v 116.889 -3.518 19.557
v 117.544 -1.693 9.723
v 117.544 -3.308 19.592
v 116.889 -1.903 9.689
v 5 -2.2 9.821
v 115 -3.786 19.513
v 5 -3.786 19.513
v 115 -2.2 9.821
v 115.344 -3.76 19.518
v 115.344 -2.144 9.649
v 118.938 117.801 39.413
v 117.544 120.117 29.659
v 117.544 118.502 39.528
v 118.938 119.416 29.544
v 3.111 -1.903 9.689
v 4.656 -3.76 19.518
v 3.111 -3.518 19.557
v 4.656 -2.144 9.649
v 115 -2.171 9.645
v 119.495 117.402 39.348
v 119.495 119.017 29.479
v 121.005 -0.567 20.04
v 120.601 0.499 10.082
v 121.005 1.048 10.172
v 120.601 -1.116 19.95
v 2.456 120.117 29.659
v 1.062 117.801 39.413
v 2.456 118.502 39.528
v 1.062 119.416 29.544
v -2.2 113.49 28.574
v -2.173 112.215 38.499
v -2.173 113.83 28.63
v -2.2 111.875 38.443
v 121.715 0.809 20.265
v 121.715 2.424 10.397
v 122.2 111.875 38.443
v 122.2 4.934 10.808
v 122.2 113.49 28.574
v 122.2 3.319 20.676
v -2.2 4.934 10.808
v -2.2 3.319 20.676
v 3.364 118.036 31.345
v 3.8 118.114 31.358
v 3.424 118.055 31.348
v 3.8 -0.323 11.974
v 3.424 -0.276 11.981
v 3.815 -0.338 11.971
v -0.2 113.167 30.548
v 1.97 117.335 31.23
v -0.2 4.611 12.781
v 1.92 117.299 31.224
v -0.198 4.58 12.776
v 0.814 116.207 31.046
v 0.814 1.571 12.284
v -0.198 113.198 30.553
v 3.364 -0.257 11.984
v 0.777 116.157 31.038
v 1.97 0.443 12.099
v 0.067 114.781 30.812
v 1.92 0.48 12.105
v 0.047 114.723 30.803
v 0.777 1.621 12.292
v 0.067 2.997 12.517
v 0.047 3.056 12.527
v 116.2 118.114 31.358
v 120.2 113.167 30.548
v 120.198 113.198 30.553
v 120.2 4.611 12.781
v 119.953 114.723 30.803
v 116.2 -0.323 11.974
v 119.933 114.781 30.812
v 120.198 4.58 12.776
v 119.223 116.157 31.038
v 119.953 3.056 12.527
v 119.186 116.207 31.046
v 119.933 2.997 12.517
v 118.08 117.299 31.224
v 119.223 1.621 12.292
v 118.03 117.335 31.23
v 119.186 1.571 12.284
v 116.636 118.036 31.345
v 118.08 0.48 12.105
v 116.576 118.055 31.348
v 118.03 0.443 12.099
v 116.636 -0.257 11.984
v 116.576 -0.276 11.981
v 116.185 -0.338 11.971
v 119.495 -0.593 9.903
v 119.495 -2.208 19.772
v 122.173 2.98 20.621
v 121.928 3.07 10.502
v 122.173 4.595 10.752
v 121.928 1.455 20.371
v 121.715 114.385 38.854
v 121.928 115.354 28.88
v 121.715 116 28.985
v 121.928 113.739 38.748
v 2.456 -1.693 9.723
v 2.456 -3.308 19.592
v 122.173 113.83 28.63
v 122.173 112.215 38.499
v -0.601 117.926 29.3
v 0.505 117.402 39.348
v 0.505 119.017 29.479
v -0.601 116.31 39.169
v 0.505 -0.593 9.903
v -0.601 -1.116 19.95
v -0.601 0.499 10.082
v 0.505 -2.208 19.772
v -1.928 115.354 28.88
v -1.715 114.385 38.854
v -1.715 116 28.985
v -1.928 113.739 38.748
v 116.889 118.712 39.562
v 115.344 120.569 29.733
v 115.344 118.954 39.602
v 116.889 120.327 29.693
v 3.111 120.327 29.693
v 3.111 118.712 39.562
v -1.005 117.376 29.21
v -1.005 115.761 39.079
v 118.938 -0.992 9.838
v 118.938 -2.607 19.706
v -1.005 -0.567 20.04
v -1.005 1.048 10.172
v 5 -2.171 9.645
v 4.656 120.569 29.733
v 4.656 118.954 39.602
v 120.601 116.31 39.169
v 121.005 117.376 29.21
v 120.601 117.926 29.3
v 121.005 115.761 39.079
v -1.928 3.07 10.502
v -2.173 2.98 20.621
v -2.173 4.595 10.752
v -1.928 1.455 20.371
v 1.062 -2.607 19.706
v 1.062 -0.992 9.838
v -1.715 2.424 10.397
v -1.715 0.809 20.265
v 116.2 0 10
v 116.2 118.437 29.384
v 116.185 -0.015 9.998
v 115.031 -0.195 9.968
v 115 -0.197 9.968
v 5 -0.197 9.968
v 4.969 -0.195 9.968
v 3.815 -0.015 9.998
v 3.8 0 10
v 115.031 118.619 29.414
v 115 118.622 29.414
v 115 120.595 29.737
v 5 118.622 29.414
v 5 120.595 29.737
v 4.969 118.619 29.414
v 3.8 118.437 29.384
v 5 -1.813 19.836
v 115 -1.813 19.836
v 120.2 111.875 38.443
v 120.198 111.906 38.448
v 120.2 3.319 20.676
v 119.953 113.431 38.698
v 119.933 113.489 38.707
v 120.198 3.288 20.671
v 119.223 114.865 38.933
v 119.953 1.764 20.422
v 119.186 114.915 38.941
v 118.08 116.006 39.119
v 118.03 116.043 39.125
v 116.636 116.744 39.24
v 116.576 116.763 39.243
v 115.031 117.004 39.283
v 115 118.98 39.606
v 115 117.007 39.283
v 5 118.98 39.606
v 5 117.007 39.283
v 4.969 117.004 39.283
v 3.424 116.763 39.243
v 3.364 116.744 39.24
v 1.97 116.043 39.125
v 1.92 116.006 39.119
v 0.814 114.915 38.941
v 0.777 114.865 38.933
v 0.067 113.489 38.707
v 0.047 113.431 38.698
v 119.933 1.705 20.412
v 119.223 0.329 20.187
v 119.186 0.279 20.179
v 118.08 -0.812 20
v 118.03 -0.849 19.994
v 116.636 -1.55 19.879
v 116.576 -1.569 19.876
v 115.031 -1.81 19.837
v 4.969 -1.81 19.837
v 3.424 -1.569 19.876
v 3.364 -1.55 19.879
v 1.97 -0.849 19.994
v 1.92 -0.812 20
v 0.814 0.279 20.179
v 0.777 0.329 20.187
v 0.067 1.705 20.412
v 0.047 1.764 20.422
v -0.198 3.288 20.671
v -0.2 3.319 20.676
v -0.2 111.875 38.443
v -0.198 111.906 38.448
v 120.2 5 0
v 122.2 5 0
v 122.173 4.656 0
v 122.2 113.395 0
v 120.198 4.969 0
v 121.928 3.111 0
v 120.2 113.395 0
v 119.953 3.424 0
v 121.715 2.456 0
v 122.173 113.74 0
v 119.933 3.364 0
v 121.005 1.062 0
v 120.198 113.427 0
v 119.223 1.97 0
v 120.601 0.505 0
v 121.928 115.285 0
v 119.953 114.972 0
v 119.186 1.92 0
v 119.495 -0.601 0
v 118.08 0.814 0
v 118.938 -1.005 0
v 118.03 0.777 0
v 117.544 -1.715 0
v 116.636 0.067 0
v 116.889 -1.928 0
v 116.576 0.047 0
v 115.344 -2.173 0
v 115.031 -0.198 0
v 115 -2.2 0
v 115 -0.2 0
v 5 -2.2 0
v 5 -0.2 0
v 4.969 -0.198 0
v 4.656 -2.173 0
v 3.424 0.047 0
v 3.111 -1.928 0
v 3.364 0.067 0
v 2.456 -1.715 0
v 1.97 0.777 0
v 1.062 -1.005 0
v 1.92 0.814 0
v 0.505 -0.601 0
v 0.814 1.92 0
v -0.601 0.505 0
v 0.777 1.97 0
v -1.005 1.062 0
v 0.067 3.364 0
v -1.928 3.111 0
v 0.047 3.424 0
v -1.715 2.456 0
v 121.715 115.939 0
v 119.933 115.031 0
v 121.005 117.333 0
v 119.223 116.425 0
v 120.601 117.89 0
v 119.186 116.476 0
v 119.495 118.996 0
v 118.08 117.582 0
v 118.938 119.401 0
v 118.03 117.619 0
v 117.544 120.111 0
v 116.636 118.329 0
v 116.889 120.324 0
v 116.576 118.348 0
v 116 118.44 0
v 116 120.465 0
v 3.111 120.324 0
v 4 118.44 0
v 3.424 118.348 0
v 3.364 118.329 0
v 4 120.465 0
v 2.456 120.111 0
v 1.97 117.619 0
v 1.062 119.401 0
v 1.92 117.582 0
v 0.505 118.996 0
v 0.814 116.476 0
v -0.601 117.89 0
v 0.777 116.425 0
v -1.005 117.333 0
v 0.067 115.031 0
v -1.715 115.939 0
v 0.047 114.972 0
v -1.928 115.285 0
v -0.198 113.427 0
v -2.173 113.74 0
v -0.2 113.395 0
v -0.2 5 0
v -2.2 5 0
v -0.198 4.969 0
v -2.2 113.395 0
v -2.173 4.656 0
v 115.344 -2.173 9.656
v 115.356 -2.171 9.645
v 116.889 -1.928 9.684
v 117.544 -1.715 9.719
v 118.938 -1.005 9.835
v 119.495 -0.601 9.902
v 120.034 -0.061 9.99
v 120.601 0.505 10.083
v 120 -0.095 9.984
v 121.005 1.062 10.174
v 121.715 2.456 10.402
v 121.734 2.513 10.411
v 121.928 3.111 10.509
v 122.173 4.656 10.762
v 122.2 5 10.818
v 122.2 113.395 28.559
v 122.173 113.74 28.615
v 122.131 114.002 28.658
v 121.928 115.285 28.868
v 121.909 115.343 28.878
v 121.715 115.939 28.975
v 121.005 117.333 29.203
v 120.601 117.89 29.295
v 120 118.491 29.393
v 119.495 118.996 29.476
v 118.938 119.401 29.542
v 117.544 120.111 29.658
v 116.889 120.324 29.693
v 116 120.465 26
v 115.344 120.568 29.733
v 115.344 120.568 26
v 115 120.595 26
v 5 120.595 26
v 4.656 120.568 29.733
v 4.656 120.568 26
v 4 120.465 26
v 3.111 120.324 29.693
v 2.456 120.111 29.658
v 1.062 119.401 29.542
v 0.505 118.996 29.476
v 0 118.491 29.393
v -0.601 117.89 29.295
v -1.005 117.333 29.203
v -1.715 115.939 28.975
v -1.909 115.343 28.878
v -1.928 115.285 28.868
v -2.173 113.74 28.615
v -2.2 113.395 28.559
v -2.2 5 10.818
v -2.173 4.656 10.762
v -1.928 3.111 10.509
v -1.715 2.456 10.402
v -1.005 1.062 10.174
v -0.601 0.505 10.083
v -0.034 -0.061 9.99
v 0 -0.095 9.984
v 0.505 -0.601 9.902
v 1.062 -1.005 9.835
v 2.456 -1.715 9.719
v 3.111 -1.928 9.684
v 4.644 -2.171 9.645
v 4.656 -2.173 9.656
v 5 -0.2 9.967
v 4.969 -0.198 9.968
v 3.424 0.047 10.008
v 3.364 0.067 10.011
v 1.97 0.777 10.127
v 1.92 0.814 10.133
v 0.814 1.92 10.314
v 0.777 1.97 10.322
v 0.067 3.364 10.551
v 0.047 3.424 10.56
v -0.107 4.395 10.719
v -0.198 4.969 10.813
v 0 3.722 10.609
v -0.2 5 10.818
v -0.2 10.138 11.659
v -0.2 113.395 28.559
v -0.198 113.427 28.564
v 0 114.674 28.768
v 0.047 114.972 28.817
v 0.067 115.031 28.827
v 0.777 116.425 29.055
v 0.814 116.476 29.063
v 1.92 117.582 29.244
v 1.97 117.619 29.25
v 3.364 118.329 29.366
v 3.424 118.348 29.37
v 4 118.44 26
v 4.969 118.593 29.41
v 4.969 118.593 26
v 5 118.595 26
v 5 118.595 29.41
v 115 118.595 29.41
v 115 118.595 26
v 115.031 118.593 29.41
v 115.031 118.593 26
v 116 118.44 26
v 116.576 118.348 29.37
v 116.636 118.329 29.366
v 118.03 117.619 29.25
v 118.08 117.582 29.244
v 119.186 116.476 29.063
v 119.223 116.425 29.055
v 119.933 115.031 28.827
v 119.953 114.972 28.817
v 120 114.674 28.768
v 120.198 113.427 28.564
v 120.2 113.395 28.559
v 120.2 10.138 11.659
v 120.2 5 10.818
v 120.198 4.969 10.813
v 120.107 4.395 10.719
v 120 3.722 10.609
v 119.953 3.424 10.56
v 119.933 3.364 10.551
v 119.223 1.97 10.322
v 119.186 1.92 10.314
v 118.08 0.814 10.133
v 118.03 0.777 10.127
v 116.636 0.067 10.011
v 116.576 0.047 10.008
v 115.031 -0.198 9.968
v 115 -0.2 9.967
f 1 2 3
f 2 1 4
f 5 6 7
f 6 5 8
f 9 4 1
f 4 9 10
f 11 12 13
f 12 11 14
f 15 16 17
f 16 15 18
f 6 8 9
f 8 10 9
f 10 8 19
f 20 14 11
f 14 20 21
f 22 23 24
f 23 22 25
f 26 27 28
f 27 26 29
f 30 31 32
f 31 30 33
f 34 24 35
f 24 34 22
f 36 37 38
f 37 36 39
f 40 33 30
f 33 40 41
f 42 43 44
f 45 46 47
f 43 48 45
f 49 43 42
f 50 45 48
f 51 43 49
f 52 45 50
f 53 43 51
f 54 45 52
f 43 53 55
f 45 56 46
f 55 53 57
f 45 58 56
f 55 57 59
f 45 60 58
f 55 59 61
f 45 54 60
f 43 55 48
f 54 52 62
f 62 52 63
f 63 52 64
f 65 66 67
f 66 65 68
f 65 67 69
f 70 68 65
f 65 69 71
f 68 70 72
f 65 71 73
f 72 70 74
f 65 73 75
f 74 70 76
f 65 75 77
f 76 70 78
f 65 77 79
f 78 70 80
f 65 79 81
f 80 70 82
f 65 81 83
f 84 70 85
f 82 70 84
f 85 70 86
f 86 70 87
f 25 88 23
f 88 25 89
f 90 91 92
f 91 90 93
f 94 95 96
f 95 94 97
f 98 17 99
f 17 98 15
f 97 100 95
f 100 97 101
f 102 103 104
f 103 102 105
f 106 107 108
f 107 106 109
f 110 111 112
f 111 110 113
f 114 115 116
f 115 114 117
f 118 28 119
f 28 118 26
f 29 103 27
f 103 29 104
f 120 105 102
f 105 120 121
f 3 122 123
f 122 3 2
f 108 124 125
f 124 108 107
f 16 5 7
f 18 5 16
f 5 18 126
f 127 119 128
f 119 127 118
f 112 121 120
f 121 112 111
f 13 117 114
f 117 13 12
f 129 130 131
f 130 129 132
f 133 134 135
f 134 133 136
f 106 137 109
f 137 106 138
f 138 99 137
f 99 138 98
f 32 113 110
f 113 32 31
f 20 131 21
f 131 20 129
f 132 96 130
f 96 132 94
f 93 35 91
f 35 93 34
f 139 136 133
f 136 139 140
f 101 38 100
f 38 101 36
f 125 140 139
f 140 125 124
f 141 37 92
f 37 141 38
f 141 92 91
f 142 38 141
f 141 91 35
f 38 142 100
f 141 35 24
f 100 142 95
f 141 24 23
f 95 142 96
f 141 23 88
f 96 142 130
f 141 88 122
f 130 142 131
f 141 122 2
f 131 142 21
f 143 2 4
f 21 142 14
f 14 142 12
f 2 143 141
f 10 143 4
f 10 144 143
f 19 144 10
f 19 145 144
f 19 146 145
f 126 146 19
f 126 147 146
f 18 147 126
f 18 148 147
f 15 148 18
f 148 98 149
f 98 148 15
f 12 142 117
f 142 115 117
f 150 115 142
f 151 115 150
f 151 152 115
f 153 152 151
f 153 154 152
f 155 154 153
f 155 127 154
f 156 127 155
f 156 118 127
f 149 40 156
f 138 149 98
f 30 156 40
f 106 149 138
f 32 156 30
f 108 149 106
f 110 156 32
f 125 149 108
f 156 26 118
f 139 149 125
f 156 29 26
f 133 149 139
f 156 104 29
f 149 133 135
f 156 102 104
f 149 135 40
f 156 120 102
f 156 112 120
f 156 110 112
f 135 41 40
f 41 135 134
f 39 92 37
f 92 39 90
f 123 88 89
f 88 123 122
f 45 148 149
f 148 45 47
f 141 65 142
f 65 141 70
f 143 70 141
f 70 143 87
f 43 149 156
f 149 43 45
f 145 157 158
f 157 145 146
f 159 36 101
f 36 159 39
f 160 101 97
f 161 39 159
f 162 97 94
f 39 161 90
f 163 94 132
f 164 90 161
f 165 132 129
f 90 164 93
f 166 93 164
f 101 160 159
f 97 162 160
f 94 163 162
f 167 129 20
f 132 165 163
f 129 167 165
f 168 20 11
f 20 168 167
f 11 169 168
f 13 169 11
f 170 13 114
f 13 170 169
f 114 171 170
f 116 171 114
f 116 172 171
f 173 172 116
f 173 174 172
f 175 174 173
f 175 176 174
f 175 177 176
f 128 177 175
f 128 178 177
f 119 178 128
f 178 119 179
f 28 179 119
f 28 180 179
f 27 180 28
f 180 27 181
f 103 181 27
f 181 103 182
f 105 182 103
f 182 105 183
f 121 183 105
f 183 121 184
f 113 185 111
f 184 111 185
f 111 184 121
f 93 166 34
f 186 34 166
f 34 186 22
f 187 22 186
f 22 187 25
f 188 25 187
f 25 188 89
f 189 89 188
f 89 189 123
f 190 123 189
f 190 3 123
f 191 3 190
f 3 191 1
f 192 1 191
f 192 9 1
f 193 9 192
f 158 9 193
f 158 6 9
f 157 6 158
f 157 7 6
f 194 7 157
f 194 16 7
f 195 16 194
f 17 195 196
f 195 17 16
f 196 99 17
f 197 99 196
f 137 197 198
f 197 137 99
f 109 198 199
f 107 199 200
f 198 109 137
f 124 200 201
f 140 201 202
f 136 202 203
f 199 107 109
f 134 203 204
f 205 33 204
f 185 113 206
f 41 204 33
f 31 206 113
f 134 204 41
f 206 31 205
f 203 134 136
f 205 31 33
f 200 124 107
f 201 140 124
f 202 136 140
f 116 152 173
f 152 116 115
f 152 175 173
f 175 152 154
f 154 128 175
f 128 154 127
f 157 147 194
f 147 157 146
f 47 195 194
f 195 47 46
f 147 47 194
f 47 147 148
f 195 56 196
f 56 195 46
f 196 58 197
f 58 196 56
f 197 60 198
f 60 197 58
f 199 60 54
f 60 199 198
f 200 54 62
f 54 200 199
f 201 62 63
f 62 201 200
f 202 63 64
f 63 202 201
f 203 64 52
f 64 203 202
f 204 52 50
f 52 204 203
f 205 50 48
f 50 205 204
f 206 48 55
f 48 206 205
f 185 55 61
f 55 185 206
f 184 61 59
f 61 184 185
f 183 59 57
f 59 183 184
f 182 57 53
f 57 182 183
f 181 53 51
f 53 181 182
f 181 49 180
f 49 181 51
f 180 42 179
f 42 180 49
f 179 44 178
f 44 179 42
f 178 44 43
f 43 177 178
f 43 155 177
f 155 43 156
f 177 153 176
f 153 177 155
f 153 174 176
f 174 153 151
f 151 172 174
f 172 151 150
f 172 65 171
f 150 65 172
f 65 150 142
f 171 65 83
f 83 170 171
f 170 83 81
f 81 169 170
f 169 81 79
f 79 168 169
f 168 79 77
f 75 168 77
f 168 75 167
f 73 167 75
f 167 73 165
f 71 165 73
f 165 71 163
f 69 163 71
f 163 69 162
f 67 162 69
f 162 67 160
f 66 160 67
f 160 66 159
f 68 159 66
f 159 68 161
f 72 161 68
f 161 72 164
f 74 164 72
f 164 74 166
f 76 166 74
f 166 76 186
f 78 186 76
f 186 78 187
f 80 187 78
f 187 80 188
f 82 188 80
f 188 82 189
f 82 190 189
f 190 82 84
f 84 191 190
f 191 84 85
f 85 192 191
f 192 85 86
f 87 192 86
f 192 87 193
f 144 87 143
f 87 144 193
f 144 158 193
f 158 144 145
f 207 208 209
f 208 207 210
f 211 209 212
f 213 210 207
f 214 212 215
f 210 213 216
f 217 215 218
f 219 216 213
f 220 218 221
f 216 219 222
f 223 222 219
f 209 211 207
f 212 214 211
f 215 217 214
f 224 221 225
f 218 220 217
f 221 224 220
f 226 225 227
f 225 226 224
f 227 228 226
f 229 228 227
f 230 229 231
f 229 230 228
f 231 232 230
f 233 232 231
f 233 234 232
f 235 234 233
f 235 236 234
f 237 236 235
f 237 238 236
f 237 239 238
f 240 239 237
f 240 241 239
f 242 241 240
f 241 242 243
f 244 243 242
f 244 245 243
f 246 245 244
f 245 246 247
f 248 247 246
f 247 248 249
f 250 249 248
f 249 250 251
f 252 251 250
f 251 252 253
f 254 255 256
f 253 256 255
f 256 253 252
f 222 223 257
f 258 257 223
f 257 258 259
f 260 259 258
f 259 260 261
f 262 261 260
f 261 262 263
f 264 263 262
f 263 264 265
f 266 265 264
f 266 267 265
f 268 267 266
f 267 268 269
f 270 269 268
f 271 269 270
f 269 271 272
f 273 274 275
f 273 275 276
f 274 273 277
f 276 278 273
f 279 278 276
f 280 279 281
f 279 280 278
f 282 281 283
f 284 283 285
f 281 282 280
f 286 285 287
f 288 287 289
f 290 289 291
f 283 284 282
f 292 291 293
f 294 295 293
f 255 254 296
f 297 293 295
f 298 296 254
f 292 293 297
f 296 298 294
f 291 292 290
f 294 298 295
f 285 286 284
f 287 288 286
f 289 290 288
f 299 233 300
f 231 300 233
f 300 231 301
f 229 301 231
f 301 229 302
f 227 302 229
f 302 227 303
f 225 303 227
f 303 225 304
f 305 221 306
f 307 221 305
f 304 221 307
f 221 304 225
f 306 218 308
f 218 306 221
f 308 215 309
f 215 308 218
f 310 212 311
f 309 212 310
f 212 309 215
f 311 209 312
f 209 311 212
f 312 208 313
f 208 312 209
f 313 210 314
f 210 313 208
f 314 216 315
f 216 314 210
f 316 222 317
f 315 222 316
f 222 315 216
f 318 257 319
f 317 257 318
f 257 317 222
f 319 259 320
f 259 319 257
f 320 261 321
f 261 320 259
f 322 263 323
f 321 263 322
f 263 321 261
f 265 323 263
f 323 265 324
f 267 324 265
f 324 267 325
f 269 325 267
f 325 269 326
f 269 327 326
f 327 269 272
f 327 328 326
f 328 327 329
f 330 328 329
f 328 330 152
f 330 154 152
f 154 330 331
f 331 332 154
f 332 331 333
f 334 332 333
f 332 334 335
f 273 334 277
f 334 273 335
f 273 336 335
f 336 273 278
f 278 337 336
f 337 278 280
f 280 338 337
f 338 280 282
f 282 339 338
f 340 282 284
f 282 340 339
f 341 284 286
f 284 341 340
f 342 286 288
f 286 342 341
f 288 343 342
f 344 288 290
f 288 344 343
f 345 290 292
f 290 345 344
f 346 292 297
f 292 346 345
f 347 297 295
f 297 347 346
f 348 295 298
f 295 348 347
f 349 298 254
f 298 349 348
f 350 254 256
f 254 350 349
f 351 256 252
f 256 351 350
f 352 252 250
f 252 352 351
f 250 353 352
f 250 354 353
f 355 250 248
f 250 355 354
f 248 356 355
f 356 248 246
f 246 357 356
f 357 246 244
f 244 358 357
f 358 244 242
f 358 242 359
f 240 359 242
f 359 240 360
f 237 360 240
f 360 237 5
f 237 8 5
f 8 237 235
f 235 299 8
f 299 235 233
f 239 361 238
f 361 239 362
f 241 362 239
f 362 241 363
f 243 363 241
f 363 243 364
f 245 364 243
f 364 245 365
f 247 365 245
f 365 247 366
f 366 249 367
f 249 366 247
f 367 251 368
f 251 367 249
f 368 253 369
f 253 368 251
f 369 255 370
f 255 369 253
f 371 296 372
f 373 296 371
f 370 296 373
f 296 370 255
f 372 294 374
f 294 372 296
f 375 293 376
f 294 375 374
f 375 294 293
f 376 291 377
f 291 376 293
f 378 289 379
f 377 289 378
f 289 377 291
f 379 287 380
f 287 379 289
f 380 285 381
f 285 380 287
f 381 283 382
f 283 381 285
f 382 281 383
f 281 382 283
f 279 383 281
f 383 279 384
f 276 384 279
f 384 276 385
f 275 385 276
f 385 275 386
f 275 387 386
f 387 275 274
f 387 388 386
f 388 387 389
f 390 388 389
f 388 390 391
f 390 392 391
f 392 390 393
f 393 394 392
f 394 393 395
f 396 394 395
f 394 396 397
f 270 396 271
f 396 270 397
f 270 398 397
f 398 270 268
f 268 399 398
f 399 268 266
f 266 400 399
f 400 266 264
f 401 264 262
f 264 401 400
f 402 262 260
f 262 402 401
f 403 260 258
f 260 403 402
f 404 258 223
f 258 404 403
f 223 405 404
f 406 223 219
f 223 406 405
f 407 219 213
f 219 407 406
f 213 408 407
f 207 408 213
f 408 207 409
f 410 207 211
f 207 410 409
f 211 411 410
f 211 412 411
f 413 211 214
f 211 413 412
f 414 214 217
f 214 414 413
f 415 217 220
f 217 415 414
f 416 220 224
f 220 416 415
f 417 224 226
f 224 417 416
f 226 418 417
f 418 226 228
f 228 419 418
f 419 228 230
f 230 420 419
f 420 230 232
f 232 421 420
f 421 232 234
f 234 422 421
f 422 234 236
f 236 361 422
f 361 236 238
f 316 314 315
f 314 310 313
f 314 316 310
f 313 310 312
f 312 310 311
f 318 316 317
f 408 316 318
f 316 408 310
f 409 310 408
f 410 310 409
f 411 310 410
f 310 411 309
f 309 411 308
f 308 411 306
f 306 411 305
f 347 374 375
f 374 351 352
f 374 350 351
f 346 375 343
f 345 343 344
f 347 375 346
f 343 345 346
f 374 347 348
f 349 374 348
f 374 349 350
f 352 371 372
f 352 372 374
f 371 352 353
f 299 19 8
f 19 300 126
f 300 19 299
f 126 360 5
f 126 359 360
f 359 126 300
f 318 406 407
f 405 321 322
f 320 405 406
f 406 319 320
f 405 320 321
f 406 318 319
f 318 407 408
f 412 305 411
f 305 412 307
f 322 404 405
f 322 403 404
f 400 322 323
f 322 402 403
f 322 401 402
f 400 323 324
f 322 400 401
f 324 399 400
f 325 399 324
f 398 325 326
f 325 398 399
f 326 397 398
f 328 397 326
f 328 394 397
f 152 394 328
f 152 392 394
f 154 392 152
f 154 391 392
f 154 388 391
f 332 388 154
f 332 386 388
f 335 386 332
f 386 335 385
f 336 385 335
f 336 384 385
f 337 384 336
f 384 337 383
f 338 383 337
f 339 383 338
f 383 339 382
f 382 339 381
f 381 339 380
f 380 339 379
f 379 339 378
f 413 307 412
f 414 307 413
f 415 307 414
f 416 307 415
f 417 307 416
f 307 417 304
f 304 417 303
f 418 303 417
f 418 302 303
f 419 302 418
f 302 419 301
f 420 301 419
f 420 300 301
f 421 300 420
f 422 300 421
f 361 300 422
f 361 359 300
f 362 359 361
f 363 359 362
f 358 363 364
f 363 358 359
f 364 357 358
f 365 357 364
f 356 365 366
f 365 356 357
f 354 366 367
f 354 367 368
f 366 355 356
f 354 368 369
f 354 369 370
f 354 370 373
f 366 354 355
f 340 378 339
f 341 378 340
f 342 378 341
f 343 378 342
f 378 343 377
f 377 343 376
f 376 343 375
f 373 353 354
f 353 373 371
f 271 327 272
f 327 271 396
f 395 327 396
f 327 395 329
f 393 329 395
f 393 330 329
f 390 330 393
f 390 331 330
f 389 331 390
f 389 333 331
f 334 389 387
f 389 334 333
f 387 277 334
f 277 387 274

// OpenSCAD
// file: ../lib/utils.scad
include <params.scad>;

function tol(val) = val - tolerance;

module cone(r, angle, invert=false) {
    h = tan((180 - angle) / 2) * r;
    translate([0, 0, -h]) {
        if (invert) {
                cylinder(r1=r,r2=0,h=h, $fn=20); 
        } else {
            cylinder(r1=0,r2=r,h=h, $fn=20); 
        }
    }
}

module roundrect(vect, r, $fn=20) {
    sq = len(vect) > 1
        ? [for (i = [0:1:len(vect)-1]) vect[i] - r * 2]
        : vect - r * 2;
    minkowski() {
        square(sq);
        translate([r, r])
            circle(r=r);
    }
}

module profile($fn=20) {
    minkowski() {
        translate([fan_case_radius, fan_case_radius, 0])
            square(fan_case - fan_case_radius * 2);
        circle(fan_case_radius, $fn);
    }
}

module fan_mount_points(radius, $fn=20) {
    offset = (fan_case - fan_screw_distance) / 2;
    translate([offset, offset, 0]) {
        circle(radius, $fn);
        translate([fan_screw_distance, 0, 0])
            circle(radius, $fn);
        translate([fan_screw_distance, fan_screw_distance, 0])
            circle(radius, $fn);
        translate([0, fan_screw_distance, 0])
            circle(radius, $fn);
    }
}

module square_grill(width, height, fin_width, fin_count) {
    fin_spacing = width / fin_count;
    difference() {
        square(width);
        union() {
            for (i = [0:1:fin_count]) {
                translate([(i + 1) * fin_spacing - (fin_spacing / 2) - (fin_width / 2), 0, 0])
                    square([fin_width, height]);
            }
        }
    }
}

module bushing(outer_r, inner_r, h) {
    linear_extrude(h)
        difference() {
            circle(r=outer_r);
            circle(r=inner_r);
        }
}

module screw_at_origin(r, d, l, head, head_d, cap, angle) {
    translate([0, 0, -l])
        screw(r, d, l, head, head_d, cap, angle);
}

module screw(r, d, l, head, head_d, cap, angle, fn=20, head_fn) {
    radius = r > 0 ? r : d / 2;
    head_r = head > 0 ? head : head_d / 2;
    hfn = head_fn ? head_fn : fn;

    union() {
        if (angle) {
            translate([0, 0, l])
                cone(head_r, angle, false);
        }
        linear_extrude(l)
            circle(r=radius, $fn=fn);
        if (cap > 0) {
            translate([0, 0, l - cap])
                linear_extrude(cap)
                    circle(r=head_r, $fn=hfn);
        }
    }
}

module inset_screw(r, d, l, head, head_d, cap, angle, inset, fn=20, head_fn) {
    screw_height = l - inset;
    head_r = head > 0 ? head : head_d / 2;

    union() {
        screw(
            r=r,
            d=d,
            l=screw_height,
            head=head_r,
            cap=cap,
            angle=angle,
            fn=fn,
            head_fn=head_fn
        );
        translate([0, 0, screw_height])
            linear_extrude(inset)
                circle(r=head_r, $fn=fn);
    }
}

function inch_to_mm(inches) = inches * 25.4;
// file: ../lib/params.scad
/*************/
/** Exhaust **/
/*************/

/**
 * Fan case sizes: used for all fan parts, including adapters, inlets
 * grills.
 */
fan_case = 120;
fan_screw_distance = 105;
fan_case_depth = 25;
fan_case_radius = 5;
fan_case_screw_radius = 2.5;
fan_case_socket_cap_radius = 5.6 / 2;
fan_case_screw_head_radius = 3;
fan_case_screw_head_angle = 90;

/**
 * Fan grill
 */
grill_screw_size = 3;
grill_screw_radius = grill_screw_size / 2;
grill_screw_inset = 2;
grill_radius = 114 / 2;
grill_fin_offset = 10;
grill_fin_thickness = 2;
grill_fin_degrees = 30;

rear_grill_thickness = 2;

front_grill_thickness = 2;
front_grill_fin_count = 6;
front_grill_fin_thickness = 2;

/**
 * Fan duct filter
 */
filter_thickness = 5;
filter_width = fan_screw_distance - fan_case_screw_radius * 3;
filter_offset = (fan_case - filter_width) / 2;

base_retainer_thickness = 2;
base_height = 30;
base_cut_offset = 10;
base_retainer_inset = 4;

/**
 * Fan to duct adapter
 */
adapter_thickness = 2;
adapter_duct_in = 4;
adapter_height = 14;
adapter_duct_height = 50;
flat_adapter_duct_height = 50;
flat_adapter_screw_radius = 2;
flat_adapter_screw_head_radius = 4;

/**
 * Fan adapter filter caddy
 */
caddy_thickness = 2;
caddy_handle_width = 20;
caddy_handle_depth = 10;
caddy_handle_grip_count = 5;
caddy_handle_grip_depth = 1;
caddy_handle_grip_width = 1;
caddy_clip_height = 2;
caddy_clip_depth = 6;
caddy_clip_offset = 1;

/***************/
/** Enclosure **/
/***************/

/**
 * Enclosure foot
 */
foot_lower_radius = 15;
foot_upper_radius = 20;
foot_height = 18;
foot_inset_radius = 4;
foot_inset_depth = 3;
foot_screw_radius = 4;
foot_screw_inset = 6;
foot_screw_head_radius = 8;

/**
 * Power supply attachment
 */
power_supply_case_thickness = 3.0;
power_supply_screw_radius = 1.5;
power_supply_bushing_radius = 7.5;

power_supply_cable_pass_width = 18;
power_supply_cable_pass_height = 5;
power_supply_cable_pass_overhang = 5;
power_supply_cable_pass_overhang_depth = power_supply_case_thickness;
power_supply_cable_pass_depth = 3;
power_supply_cable_pass_thickness = 3;

/**************/
/** Filament **/
/**************/

/**
 * Filament case passthrough
 */
through_base_width = 60;
through_base_height = 20;
through_base_depth = 5;
through_base_screw_offset = 10;
through_base_screw_radius = 1.5;
through_base_screw_head = 2.8;
through_base_nut_head = 3.25;
through_base_nut_inset = 3;
through_base_screw_inset = 3;
through_base_fitting_d = 5;
case_thickness = 1;
case_through_radius = 6;
filament_radius = 1;

inlet_length = 10;
inlet_outer_radius = 3;
inlet_inner_radius = 2;
inlet_angle = -20;


/**********/
/** Misc **/
/**********/

// tolerance is used all over the place to decide how closely parts fit
// together; adjust to the tolerances of your printer. 0.2 works fine for
// a Prusa i3 MK3.
tolerance = 0.2;
// main file
include <../lib/params.scad>;
use <../lib/utils.scad>;

case_length = fan_case + tolerance + base_retainer_thickness;
base_cut_angle = atan((base_height - base_cut_offset) / case_length);
base_length = (cos(base_cut_angle) * case_length) - base_retainer_thickness - tolerance;

vent_cutout = base_height / 2;
base_retainer_offset = base_retainer_inset * 2 + (tolerance + base_retainer_thickness);

module base_profile($fn=20) {
    minkowski() {
        translate([fan_case_radius, fan_case_radius, 0])
            square([fan_case - fan_case_radius * 2, base_length - fan_case_radius * 2]);
        circle(fan_case_radius, $fn);
    }
}

module base_riser() {
    difference() {
        offset(r=tolerance+base_retainer_thickness)
            base_profile();
        offset(r=tolerance)
            base_profile();
    }
}

module base_retainer() {
    difference() {
        offset(r=tolerance+base_retainer_thickness)
            profile();
        offset(r=tolerance)
            profile();
    }
}

difference() {
    union() {
        // retainer
        translate([0, 0, base_cut_offset])
            rotate([base_cut_angle, 0, 0])
                union() {
                    // retainer wall
                    linear_extrude(height=10)
                        base_retainer();
                    // retainer floor
                    difference() {
                        // profile
                        linear_extrude(height=base_retainer_thickness)
                            offset(r=tolerance+base_retainer_thickness)
                                profile();
                        // center cut
                        linear_extrude(height=base_retainer_thickness)
                            translate([base_retainer_inset, 0, 0])
                                offset(r=tolerance)
                                    square([case_length - base_retainer_offset, case_length]);
                    }
                }
        // reiser
        difference() {
            // reiser wall
            linear_extrude(height=base_height)
                base_riser();
            // reiser angle cut
            translate([0, 0, base_cut_offset])
                rotate([base_cut_angle, 0, 0])
                    linear_extrude(height=base_height)
                        offset(tolerance + base_retainer_thickness)
                            square([fan_case, fan_case + vent_cutout]);
        }
    }
    // front vent cutout
    translate([base_retainer_inset, case_length - base_retainer_offset, 0])
        cube([case_length - base_retainer_offset, vent_cutout, base_height - base_retainer_inset]);
}
